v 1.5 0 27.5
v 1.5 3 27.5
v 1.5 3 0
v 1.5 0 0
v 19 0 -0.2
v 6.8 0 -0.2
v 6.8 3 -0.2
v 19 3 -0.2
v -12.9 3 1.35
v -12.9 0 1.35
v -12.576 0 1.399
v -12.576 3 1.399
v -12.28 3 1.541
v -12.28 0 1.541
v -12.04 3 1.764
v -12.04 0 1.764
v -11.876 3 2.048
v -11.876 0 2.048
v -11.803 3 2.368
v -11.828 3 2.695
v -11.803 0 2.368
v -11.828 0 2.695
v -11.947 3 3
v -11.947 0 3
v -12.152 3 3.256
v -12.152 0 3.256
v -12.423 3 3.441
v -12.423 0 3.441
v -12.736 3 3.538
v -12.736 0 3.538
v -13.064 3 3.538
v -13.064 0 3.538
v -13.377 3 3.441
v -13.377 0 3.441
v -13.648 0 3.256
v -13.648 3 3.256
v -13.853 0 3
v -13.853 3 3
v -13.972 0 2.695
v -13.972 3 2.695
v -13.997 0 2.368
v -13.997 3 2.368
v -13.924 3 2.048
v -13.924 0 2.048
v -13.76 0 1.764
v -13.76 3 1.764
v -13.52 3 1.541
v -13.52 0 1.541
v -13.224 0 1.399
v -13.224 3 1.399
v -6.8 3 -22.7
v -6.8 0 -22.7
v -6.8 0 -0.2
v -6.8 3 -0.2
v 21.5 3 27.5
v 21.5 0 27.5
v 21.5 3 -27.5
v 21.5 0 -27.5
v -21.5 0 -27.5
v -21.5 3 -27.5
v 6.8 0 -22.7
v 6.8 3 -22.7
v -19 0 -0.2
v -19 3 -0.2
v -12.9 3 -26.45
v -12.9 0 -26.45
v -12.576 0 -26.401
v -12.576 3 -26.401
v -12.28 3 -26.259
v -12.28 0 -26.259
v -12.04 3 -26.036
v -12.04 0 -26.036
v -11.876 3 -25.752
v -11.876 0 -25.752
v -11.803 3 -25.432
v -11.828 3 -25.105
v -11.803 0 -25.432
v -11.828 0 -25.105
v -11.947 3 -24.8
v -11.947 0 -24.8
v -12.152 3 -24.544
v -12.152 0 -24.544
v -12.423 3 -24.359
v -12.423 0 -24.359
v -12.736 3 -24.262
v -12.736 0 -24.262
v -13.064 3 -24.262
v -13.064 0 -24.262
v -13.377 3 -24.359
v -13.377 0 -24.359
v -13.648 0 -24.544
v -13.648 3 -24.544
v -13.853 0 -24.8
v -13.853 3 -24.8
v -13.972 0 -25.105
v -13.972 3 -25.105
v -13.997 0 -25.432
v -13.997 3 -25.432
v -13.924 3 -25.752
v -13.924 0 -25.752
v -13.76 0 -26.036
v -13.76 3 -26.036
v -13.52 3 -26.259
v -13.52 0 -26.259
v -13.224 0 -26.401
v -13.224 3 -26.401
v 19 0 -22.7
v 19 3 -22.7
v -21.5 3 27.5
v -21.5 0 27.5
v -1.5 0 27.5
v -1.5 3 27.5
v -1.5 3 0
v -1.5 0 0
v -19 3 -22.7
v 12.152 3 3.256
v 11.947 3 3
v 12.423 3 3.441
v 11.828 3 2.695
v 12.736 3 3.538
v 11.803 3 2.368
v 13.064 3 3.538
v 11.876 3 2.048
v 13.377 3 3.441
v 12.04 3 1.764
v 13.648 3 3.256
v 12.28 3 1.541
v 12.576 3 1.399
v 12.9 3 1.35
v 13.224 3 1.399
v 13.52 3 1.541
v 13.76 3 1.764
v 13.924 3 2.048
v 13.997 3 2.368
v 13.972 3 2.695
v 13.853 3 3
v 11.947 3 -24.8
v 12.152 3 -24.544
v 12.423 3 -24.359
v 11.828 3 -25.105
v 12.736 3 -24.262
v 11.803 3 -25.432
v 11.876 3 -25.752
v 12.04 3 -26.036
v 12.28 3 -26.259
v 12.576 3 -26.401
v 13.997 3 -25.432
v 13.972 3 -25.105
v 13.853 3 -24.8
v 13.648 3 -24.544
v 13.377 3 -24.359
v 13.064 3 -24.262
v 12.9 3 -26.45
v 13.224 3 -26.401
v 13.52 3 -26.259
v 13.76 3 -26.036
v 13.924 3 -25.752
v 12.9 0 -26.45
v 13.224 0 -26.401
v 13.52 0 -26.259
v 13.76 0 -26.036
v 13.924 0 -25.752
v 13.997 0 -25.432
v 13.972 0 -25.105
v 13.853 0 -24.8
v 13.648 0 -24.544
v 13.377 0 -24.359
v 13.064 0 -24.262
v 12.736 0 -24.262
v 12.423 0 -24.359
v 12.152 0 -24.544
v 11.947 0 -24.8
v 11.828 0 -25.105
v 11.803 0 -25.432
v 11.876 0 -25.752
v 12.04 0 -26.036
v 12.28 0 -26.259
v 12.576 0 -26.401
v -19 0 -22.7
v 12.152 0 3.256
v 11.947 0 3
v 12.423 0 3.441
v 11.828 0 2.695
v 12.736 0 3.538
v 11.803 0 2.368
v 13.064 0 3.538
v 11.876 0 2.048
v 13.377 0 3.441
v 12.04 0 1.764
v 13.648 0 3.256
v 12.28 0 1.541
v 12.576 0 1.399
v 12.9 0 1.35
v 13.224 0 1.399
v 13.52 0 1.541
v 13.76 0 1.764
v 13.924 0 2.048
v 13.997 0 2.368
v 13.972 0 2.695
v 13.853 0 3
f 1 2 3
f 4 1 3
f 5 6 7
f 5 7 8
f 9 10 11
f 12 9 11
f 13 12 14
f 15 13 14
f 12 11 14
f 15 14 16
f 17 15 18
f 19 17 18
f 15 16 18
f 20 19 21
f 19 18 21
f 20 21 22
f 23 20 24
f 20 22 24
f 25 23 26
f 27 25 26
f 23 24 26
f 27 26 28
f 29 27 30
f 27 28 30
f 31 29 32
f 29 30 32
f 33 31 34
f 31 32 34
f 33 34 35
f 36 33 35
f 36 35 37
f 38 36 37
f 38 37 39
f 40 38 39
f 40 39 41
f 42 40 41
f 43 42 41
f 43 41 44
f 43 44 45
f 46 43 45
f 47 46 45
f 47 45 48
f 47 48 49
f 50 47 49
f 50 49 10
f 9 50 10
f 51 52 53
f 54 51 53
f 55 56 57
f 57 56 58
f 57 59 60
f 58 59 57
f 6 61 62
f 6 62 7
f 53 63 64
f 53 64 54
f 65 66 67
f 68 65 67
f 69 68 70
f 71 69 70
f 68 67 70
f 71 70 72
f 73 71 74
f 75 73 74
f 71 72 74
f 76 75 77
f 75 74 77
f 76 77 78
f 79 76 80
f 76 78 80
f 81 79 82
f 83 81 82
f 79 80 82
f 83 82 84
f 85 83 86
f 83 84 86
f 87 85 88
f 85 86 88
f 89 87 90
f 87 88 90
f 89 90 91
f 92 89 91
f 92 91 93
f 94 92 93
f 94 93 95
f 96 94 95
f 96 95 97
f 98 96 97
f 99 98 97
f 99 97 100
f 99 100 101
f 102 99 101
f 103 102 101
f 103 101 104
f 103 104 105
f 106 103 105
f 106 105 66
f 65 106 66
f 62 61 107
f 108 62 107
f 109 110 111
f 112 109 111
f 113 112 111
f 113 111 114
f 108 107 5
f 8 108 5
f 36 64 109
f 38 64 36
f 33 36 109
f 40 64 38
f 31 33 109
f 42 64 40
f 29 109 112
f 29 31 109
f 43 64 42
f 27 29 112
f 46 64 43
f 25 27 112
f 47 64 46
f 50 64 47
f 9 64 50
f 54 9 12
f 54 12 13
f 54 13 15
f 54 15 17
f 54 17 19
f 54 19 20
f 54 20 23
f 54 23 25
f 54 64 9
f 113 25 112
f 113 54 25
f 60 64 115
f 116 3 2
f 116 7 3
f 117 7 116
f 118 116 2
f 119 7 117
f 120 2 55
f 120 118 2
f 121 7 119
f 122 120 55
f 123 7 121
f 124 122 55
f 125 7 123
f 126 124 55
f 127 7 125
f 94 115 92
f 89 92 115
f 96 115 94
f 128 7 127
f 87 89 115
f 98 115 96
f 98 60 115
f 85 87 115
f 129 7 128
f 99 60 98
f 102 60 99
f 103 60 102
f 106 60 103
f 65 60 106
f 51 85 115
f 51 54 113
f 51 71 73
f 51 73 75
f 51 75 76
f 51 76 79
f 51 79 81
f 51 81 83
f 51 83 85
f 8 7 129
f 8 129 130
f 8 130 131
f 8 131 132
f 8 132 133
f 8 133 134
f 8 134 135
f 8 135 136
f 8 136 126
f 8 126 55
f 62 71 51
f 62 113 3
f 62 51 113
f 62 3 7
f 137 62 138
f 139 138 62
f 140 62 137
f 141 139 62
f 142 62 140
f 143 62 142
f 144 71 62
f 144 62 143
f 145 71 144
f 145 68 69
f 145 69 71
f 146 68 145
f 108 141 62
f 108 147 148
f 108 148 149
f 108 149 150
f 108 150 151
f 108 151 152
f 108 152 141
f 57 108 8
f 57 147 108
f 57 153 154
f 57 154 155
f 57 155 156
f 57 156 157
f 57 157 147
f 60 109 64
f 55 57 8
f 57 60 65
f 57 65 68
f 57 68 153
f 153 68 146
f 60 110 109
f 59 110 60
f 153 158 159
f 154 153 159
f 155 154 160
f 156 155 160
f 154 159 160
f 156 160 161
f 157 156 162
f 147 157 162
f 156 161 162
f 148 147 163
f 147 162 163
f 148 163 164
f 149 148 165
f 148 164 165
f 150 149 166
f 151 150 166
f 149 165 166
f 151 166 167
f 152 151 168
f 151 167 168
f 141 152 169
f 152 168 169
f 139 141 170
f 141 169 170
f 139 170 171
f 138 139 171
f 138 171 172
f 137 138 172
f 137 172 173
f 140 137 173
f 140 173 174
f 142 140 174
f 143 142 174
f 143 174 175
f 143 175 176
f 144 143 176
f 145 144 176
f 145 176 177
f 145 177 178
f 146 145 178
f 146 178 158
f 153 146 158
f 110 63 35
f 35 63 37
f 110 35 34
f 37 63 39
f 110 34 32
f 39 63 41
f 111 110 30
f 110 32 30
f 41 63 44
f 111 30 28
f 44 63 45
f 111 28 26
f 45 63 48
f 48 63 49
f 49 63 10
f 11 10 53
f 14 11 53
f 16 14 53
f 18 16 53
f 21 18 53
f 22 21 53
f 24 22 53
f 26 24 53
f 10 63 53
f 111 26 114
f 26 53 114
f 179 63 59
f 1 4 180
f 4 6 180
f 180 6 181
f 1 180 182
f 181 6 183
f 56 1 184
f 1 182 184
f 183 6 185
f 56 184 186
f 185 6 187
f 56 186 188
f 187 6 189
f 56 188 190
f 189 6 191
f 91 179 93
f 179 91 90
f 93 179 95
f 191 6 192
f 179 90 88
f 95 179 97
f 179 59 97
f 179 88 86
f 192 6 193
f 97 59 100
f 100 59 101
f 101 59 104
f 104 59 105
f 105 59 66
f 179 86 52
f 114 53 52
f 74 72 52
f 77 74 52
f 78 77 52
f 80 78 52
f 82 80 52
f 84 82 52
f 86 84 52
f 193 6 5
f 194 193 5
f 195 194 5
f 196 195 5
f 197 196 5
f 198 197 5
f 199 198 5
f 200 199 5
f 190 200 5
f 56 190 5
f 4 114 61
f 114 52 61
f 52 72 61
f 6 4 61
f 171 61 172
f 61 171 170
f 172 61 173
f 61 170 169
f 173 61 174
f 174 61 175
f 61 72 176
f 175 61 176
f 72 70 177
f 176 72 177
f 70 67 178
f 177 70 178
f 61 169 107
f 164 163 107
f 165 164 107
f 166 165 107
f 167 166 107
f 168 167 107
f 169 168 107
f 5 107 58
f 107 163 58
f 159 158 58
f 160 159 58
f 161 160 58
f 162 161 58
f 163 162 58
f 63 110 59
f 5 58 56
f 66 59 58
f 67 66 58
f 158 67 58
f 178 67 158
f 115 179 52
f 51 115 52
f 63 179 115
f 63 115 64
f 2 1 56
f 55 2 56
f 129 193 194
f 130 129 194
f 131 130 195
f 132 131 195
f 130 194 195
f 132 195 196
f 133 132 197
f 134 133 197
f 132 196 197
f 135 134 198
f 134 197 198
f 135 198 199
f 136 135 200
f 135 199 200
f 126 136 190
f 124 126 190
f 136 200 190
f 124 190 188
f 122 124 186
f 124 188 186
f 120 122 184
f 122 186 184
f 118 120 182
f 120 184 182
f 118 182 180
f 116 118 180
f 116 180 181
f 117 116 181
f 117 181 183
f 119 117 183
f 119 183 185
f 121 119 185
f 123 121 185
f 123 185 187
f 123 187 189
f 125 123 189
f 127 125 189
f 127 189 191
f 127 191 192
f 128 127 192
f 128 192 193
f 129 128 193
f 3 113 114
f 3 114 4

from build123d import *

# Parameters (mm, degrees)
SKETCH1_W           = 43
SKETCH1_H           = 55
BOSS_EXTRUDE1_DEPTH = 3
SKETCH2_W           = 3
SKETCH2_H           = 27.5
CUT_EXTRUDE1_DEPTH  = 10
SKETCH3_R           = 1.1
SKETCH3_W           = 12.2
SKETCH3_H           = 22.5
CUT_EXTRUDE2_DEPTH  = 10


with BuildPart() as part:
    # Sketch1 → Boss-Extrude1 (new body)
    with BuildSketch(Plane(origin=(0, 0, 0), x_dir=(1, 0, 0), z_dir=(0, 1, 0))):
        Rectangle(SKETCH1_W, SKETCH1_H)
    extrude(amount=BOSS_EXTRUDE1_DEPTH)

    # Sketch2 → Cut-Extrude1 (cut)
    with BuildSketch(Plane(origin=(0, 3, 0), x_dir=(1, 0, 0), z_dir=(0, 1, 0))):
        with Locations((0, -13.75)):
            Rectangle(SKETCH2_W, SKETCH2_H)
    extrude(amount=-CUT_EXTRUDE1_DEPTH, mode=Mode.SUBTRACT)

    # Sketch3 → Cut-Extrude2 (cut)
    with BuildSketch(Plane.XZ):
        with Locations(Location((12.9, -25.35, 0), (0, 0, 270))):
            Circle(SKETCH3_R)
        with Locations(Location((12.9, 2.45, 0), (0, 0, 270))):
            Circle(SKETCH3_R)
        with Locations(Location((-12.9, -25.35, 0), (0, 0, 270))):
            Circle(SKETCH3_R)
        with Locations(Location((-12.9, 2.45, 0), (0, 0, 270))):
            Circle(SKETCH3_R)
        with Locations((12.9, -11.45)):
            Rectangle(SKETCH3_W, SKETCH3_H)
        with Locations((-12.9, -11.45)):
            Rectangle(SKETCH3_W, SKETCH3_H)
    extrude(amount=-CUT_EXTRUDE2_DEPTH, mode=Mode.SUBTRACT)


solid = part.part
